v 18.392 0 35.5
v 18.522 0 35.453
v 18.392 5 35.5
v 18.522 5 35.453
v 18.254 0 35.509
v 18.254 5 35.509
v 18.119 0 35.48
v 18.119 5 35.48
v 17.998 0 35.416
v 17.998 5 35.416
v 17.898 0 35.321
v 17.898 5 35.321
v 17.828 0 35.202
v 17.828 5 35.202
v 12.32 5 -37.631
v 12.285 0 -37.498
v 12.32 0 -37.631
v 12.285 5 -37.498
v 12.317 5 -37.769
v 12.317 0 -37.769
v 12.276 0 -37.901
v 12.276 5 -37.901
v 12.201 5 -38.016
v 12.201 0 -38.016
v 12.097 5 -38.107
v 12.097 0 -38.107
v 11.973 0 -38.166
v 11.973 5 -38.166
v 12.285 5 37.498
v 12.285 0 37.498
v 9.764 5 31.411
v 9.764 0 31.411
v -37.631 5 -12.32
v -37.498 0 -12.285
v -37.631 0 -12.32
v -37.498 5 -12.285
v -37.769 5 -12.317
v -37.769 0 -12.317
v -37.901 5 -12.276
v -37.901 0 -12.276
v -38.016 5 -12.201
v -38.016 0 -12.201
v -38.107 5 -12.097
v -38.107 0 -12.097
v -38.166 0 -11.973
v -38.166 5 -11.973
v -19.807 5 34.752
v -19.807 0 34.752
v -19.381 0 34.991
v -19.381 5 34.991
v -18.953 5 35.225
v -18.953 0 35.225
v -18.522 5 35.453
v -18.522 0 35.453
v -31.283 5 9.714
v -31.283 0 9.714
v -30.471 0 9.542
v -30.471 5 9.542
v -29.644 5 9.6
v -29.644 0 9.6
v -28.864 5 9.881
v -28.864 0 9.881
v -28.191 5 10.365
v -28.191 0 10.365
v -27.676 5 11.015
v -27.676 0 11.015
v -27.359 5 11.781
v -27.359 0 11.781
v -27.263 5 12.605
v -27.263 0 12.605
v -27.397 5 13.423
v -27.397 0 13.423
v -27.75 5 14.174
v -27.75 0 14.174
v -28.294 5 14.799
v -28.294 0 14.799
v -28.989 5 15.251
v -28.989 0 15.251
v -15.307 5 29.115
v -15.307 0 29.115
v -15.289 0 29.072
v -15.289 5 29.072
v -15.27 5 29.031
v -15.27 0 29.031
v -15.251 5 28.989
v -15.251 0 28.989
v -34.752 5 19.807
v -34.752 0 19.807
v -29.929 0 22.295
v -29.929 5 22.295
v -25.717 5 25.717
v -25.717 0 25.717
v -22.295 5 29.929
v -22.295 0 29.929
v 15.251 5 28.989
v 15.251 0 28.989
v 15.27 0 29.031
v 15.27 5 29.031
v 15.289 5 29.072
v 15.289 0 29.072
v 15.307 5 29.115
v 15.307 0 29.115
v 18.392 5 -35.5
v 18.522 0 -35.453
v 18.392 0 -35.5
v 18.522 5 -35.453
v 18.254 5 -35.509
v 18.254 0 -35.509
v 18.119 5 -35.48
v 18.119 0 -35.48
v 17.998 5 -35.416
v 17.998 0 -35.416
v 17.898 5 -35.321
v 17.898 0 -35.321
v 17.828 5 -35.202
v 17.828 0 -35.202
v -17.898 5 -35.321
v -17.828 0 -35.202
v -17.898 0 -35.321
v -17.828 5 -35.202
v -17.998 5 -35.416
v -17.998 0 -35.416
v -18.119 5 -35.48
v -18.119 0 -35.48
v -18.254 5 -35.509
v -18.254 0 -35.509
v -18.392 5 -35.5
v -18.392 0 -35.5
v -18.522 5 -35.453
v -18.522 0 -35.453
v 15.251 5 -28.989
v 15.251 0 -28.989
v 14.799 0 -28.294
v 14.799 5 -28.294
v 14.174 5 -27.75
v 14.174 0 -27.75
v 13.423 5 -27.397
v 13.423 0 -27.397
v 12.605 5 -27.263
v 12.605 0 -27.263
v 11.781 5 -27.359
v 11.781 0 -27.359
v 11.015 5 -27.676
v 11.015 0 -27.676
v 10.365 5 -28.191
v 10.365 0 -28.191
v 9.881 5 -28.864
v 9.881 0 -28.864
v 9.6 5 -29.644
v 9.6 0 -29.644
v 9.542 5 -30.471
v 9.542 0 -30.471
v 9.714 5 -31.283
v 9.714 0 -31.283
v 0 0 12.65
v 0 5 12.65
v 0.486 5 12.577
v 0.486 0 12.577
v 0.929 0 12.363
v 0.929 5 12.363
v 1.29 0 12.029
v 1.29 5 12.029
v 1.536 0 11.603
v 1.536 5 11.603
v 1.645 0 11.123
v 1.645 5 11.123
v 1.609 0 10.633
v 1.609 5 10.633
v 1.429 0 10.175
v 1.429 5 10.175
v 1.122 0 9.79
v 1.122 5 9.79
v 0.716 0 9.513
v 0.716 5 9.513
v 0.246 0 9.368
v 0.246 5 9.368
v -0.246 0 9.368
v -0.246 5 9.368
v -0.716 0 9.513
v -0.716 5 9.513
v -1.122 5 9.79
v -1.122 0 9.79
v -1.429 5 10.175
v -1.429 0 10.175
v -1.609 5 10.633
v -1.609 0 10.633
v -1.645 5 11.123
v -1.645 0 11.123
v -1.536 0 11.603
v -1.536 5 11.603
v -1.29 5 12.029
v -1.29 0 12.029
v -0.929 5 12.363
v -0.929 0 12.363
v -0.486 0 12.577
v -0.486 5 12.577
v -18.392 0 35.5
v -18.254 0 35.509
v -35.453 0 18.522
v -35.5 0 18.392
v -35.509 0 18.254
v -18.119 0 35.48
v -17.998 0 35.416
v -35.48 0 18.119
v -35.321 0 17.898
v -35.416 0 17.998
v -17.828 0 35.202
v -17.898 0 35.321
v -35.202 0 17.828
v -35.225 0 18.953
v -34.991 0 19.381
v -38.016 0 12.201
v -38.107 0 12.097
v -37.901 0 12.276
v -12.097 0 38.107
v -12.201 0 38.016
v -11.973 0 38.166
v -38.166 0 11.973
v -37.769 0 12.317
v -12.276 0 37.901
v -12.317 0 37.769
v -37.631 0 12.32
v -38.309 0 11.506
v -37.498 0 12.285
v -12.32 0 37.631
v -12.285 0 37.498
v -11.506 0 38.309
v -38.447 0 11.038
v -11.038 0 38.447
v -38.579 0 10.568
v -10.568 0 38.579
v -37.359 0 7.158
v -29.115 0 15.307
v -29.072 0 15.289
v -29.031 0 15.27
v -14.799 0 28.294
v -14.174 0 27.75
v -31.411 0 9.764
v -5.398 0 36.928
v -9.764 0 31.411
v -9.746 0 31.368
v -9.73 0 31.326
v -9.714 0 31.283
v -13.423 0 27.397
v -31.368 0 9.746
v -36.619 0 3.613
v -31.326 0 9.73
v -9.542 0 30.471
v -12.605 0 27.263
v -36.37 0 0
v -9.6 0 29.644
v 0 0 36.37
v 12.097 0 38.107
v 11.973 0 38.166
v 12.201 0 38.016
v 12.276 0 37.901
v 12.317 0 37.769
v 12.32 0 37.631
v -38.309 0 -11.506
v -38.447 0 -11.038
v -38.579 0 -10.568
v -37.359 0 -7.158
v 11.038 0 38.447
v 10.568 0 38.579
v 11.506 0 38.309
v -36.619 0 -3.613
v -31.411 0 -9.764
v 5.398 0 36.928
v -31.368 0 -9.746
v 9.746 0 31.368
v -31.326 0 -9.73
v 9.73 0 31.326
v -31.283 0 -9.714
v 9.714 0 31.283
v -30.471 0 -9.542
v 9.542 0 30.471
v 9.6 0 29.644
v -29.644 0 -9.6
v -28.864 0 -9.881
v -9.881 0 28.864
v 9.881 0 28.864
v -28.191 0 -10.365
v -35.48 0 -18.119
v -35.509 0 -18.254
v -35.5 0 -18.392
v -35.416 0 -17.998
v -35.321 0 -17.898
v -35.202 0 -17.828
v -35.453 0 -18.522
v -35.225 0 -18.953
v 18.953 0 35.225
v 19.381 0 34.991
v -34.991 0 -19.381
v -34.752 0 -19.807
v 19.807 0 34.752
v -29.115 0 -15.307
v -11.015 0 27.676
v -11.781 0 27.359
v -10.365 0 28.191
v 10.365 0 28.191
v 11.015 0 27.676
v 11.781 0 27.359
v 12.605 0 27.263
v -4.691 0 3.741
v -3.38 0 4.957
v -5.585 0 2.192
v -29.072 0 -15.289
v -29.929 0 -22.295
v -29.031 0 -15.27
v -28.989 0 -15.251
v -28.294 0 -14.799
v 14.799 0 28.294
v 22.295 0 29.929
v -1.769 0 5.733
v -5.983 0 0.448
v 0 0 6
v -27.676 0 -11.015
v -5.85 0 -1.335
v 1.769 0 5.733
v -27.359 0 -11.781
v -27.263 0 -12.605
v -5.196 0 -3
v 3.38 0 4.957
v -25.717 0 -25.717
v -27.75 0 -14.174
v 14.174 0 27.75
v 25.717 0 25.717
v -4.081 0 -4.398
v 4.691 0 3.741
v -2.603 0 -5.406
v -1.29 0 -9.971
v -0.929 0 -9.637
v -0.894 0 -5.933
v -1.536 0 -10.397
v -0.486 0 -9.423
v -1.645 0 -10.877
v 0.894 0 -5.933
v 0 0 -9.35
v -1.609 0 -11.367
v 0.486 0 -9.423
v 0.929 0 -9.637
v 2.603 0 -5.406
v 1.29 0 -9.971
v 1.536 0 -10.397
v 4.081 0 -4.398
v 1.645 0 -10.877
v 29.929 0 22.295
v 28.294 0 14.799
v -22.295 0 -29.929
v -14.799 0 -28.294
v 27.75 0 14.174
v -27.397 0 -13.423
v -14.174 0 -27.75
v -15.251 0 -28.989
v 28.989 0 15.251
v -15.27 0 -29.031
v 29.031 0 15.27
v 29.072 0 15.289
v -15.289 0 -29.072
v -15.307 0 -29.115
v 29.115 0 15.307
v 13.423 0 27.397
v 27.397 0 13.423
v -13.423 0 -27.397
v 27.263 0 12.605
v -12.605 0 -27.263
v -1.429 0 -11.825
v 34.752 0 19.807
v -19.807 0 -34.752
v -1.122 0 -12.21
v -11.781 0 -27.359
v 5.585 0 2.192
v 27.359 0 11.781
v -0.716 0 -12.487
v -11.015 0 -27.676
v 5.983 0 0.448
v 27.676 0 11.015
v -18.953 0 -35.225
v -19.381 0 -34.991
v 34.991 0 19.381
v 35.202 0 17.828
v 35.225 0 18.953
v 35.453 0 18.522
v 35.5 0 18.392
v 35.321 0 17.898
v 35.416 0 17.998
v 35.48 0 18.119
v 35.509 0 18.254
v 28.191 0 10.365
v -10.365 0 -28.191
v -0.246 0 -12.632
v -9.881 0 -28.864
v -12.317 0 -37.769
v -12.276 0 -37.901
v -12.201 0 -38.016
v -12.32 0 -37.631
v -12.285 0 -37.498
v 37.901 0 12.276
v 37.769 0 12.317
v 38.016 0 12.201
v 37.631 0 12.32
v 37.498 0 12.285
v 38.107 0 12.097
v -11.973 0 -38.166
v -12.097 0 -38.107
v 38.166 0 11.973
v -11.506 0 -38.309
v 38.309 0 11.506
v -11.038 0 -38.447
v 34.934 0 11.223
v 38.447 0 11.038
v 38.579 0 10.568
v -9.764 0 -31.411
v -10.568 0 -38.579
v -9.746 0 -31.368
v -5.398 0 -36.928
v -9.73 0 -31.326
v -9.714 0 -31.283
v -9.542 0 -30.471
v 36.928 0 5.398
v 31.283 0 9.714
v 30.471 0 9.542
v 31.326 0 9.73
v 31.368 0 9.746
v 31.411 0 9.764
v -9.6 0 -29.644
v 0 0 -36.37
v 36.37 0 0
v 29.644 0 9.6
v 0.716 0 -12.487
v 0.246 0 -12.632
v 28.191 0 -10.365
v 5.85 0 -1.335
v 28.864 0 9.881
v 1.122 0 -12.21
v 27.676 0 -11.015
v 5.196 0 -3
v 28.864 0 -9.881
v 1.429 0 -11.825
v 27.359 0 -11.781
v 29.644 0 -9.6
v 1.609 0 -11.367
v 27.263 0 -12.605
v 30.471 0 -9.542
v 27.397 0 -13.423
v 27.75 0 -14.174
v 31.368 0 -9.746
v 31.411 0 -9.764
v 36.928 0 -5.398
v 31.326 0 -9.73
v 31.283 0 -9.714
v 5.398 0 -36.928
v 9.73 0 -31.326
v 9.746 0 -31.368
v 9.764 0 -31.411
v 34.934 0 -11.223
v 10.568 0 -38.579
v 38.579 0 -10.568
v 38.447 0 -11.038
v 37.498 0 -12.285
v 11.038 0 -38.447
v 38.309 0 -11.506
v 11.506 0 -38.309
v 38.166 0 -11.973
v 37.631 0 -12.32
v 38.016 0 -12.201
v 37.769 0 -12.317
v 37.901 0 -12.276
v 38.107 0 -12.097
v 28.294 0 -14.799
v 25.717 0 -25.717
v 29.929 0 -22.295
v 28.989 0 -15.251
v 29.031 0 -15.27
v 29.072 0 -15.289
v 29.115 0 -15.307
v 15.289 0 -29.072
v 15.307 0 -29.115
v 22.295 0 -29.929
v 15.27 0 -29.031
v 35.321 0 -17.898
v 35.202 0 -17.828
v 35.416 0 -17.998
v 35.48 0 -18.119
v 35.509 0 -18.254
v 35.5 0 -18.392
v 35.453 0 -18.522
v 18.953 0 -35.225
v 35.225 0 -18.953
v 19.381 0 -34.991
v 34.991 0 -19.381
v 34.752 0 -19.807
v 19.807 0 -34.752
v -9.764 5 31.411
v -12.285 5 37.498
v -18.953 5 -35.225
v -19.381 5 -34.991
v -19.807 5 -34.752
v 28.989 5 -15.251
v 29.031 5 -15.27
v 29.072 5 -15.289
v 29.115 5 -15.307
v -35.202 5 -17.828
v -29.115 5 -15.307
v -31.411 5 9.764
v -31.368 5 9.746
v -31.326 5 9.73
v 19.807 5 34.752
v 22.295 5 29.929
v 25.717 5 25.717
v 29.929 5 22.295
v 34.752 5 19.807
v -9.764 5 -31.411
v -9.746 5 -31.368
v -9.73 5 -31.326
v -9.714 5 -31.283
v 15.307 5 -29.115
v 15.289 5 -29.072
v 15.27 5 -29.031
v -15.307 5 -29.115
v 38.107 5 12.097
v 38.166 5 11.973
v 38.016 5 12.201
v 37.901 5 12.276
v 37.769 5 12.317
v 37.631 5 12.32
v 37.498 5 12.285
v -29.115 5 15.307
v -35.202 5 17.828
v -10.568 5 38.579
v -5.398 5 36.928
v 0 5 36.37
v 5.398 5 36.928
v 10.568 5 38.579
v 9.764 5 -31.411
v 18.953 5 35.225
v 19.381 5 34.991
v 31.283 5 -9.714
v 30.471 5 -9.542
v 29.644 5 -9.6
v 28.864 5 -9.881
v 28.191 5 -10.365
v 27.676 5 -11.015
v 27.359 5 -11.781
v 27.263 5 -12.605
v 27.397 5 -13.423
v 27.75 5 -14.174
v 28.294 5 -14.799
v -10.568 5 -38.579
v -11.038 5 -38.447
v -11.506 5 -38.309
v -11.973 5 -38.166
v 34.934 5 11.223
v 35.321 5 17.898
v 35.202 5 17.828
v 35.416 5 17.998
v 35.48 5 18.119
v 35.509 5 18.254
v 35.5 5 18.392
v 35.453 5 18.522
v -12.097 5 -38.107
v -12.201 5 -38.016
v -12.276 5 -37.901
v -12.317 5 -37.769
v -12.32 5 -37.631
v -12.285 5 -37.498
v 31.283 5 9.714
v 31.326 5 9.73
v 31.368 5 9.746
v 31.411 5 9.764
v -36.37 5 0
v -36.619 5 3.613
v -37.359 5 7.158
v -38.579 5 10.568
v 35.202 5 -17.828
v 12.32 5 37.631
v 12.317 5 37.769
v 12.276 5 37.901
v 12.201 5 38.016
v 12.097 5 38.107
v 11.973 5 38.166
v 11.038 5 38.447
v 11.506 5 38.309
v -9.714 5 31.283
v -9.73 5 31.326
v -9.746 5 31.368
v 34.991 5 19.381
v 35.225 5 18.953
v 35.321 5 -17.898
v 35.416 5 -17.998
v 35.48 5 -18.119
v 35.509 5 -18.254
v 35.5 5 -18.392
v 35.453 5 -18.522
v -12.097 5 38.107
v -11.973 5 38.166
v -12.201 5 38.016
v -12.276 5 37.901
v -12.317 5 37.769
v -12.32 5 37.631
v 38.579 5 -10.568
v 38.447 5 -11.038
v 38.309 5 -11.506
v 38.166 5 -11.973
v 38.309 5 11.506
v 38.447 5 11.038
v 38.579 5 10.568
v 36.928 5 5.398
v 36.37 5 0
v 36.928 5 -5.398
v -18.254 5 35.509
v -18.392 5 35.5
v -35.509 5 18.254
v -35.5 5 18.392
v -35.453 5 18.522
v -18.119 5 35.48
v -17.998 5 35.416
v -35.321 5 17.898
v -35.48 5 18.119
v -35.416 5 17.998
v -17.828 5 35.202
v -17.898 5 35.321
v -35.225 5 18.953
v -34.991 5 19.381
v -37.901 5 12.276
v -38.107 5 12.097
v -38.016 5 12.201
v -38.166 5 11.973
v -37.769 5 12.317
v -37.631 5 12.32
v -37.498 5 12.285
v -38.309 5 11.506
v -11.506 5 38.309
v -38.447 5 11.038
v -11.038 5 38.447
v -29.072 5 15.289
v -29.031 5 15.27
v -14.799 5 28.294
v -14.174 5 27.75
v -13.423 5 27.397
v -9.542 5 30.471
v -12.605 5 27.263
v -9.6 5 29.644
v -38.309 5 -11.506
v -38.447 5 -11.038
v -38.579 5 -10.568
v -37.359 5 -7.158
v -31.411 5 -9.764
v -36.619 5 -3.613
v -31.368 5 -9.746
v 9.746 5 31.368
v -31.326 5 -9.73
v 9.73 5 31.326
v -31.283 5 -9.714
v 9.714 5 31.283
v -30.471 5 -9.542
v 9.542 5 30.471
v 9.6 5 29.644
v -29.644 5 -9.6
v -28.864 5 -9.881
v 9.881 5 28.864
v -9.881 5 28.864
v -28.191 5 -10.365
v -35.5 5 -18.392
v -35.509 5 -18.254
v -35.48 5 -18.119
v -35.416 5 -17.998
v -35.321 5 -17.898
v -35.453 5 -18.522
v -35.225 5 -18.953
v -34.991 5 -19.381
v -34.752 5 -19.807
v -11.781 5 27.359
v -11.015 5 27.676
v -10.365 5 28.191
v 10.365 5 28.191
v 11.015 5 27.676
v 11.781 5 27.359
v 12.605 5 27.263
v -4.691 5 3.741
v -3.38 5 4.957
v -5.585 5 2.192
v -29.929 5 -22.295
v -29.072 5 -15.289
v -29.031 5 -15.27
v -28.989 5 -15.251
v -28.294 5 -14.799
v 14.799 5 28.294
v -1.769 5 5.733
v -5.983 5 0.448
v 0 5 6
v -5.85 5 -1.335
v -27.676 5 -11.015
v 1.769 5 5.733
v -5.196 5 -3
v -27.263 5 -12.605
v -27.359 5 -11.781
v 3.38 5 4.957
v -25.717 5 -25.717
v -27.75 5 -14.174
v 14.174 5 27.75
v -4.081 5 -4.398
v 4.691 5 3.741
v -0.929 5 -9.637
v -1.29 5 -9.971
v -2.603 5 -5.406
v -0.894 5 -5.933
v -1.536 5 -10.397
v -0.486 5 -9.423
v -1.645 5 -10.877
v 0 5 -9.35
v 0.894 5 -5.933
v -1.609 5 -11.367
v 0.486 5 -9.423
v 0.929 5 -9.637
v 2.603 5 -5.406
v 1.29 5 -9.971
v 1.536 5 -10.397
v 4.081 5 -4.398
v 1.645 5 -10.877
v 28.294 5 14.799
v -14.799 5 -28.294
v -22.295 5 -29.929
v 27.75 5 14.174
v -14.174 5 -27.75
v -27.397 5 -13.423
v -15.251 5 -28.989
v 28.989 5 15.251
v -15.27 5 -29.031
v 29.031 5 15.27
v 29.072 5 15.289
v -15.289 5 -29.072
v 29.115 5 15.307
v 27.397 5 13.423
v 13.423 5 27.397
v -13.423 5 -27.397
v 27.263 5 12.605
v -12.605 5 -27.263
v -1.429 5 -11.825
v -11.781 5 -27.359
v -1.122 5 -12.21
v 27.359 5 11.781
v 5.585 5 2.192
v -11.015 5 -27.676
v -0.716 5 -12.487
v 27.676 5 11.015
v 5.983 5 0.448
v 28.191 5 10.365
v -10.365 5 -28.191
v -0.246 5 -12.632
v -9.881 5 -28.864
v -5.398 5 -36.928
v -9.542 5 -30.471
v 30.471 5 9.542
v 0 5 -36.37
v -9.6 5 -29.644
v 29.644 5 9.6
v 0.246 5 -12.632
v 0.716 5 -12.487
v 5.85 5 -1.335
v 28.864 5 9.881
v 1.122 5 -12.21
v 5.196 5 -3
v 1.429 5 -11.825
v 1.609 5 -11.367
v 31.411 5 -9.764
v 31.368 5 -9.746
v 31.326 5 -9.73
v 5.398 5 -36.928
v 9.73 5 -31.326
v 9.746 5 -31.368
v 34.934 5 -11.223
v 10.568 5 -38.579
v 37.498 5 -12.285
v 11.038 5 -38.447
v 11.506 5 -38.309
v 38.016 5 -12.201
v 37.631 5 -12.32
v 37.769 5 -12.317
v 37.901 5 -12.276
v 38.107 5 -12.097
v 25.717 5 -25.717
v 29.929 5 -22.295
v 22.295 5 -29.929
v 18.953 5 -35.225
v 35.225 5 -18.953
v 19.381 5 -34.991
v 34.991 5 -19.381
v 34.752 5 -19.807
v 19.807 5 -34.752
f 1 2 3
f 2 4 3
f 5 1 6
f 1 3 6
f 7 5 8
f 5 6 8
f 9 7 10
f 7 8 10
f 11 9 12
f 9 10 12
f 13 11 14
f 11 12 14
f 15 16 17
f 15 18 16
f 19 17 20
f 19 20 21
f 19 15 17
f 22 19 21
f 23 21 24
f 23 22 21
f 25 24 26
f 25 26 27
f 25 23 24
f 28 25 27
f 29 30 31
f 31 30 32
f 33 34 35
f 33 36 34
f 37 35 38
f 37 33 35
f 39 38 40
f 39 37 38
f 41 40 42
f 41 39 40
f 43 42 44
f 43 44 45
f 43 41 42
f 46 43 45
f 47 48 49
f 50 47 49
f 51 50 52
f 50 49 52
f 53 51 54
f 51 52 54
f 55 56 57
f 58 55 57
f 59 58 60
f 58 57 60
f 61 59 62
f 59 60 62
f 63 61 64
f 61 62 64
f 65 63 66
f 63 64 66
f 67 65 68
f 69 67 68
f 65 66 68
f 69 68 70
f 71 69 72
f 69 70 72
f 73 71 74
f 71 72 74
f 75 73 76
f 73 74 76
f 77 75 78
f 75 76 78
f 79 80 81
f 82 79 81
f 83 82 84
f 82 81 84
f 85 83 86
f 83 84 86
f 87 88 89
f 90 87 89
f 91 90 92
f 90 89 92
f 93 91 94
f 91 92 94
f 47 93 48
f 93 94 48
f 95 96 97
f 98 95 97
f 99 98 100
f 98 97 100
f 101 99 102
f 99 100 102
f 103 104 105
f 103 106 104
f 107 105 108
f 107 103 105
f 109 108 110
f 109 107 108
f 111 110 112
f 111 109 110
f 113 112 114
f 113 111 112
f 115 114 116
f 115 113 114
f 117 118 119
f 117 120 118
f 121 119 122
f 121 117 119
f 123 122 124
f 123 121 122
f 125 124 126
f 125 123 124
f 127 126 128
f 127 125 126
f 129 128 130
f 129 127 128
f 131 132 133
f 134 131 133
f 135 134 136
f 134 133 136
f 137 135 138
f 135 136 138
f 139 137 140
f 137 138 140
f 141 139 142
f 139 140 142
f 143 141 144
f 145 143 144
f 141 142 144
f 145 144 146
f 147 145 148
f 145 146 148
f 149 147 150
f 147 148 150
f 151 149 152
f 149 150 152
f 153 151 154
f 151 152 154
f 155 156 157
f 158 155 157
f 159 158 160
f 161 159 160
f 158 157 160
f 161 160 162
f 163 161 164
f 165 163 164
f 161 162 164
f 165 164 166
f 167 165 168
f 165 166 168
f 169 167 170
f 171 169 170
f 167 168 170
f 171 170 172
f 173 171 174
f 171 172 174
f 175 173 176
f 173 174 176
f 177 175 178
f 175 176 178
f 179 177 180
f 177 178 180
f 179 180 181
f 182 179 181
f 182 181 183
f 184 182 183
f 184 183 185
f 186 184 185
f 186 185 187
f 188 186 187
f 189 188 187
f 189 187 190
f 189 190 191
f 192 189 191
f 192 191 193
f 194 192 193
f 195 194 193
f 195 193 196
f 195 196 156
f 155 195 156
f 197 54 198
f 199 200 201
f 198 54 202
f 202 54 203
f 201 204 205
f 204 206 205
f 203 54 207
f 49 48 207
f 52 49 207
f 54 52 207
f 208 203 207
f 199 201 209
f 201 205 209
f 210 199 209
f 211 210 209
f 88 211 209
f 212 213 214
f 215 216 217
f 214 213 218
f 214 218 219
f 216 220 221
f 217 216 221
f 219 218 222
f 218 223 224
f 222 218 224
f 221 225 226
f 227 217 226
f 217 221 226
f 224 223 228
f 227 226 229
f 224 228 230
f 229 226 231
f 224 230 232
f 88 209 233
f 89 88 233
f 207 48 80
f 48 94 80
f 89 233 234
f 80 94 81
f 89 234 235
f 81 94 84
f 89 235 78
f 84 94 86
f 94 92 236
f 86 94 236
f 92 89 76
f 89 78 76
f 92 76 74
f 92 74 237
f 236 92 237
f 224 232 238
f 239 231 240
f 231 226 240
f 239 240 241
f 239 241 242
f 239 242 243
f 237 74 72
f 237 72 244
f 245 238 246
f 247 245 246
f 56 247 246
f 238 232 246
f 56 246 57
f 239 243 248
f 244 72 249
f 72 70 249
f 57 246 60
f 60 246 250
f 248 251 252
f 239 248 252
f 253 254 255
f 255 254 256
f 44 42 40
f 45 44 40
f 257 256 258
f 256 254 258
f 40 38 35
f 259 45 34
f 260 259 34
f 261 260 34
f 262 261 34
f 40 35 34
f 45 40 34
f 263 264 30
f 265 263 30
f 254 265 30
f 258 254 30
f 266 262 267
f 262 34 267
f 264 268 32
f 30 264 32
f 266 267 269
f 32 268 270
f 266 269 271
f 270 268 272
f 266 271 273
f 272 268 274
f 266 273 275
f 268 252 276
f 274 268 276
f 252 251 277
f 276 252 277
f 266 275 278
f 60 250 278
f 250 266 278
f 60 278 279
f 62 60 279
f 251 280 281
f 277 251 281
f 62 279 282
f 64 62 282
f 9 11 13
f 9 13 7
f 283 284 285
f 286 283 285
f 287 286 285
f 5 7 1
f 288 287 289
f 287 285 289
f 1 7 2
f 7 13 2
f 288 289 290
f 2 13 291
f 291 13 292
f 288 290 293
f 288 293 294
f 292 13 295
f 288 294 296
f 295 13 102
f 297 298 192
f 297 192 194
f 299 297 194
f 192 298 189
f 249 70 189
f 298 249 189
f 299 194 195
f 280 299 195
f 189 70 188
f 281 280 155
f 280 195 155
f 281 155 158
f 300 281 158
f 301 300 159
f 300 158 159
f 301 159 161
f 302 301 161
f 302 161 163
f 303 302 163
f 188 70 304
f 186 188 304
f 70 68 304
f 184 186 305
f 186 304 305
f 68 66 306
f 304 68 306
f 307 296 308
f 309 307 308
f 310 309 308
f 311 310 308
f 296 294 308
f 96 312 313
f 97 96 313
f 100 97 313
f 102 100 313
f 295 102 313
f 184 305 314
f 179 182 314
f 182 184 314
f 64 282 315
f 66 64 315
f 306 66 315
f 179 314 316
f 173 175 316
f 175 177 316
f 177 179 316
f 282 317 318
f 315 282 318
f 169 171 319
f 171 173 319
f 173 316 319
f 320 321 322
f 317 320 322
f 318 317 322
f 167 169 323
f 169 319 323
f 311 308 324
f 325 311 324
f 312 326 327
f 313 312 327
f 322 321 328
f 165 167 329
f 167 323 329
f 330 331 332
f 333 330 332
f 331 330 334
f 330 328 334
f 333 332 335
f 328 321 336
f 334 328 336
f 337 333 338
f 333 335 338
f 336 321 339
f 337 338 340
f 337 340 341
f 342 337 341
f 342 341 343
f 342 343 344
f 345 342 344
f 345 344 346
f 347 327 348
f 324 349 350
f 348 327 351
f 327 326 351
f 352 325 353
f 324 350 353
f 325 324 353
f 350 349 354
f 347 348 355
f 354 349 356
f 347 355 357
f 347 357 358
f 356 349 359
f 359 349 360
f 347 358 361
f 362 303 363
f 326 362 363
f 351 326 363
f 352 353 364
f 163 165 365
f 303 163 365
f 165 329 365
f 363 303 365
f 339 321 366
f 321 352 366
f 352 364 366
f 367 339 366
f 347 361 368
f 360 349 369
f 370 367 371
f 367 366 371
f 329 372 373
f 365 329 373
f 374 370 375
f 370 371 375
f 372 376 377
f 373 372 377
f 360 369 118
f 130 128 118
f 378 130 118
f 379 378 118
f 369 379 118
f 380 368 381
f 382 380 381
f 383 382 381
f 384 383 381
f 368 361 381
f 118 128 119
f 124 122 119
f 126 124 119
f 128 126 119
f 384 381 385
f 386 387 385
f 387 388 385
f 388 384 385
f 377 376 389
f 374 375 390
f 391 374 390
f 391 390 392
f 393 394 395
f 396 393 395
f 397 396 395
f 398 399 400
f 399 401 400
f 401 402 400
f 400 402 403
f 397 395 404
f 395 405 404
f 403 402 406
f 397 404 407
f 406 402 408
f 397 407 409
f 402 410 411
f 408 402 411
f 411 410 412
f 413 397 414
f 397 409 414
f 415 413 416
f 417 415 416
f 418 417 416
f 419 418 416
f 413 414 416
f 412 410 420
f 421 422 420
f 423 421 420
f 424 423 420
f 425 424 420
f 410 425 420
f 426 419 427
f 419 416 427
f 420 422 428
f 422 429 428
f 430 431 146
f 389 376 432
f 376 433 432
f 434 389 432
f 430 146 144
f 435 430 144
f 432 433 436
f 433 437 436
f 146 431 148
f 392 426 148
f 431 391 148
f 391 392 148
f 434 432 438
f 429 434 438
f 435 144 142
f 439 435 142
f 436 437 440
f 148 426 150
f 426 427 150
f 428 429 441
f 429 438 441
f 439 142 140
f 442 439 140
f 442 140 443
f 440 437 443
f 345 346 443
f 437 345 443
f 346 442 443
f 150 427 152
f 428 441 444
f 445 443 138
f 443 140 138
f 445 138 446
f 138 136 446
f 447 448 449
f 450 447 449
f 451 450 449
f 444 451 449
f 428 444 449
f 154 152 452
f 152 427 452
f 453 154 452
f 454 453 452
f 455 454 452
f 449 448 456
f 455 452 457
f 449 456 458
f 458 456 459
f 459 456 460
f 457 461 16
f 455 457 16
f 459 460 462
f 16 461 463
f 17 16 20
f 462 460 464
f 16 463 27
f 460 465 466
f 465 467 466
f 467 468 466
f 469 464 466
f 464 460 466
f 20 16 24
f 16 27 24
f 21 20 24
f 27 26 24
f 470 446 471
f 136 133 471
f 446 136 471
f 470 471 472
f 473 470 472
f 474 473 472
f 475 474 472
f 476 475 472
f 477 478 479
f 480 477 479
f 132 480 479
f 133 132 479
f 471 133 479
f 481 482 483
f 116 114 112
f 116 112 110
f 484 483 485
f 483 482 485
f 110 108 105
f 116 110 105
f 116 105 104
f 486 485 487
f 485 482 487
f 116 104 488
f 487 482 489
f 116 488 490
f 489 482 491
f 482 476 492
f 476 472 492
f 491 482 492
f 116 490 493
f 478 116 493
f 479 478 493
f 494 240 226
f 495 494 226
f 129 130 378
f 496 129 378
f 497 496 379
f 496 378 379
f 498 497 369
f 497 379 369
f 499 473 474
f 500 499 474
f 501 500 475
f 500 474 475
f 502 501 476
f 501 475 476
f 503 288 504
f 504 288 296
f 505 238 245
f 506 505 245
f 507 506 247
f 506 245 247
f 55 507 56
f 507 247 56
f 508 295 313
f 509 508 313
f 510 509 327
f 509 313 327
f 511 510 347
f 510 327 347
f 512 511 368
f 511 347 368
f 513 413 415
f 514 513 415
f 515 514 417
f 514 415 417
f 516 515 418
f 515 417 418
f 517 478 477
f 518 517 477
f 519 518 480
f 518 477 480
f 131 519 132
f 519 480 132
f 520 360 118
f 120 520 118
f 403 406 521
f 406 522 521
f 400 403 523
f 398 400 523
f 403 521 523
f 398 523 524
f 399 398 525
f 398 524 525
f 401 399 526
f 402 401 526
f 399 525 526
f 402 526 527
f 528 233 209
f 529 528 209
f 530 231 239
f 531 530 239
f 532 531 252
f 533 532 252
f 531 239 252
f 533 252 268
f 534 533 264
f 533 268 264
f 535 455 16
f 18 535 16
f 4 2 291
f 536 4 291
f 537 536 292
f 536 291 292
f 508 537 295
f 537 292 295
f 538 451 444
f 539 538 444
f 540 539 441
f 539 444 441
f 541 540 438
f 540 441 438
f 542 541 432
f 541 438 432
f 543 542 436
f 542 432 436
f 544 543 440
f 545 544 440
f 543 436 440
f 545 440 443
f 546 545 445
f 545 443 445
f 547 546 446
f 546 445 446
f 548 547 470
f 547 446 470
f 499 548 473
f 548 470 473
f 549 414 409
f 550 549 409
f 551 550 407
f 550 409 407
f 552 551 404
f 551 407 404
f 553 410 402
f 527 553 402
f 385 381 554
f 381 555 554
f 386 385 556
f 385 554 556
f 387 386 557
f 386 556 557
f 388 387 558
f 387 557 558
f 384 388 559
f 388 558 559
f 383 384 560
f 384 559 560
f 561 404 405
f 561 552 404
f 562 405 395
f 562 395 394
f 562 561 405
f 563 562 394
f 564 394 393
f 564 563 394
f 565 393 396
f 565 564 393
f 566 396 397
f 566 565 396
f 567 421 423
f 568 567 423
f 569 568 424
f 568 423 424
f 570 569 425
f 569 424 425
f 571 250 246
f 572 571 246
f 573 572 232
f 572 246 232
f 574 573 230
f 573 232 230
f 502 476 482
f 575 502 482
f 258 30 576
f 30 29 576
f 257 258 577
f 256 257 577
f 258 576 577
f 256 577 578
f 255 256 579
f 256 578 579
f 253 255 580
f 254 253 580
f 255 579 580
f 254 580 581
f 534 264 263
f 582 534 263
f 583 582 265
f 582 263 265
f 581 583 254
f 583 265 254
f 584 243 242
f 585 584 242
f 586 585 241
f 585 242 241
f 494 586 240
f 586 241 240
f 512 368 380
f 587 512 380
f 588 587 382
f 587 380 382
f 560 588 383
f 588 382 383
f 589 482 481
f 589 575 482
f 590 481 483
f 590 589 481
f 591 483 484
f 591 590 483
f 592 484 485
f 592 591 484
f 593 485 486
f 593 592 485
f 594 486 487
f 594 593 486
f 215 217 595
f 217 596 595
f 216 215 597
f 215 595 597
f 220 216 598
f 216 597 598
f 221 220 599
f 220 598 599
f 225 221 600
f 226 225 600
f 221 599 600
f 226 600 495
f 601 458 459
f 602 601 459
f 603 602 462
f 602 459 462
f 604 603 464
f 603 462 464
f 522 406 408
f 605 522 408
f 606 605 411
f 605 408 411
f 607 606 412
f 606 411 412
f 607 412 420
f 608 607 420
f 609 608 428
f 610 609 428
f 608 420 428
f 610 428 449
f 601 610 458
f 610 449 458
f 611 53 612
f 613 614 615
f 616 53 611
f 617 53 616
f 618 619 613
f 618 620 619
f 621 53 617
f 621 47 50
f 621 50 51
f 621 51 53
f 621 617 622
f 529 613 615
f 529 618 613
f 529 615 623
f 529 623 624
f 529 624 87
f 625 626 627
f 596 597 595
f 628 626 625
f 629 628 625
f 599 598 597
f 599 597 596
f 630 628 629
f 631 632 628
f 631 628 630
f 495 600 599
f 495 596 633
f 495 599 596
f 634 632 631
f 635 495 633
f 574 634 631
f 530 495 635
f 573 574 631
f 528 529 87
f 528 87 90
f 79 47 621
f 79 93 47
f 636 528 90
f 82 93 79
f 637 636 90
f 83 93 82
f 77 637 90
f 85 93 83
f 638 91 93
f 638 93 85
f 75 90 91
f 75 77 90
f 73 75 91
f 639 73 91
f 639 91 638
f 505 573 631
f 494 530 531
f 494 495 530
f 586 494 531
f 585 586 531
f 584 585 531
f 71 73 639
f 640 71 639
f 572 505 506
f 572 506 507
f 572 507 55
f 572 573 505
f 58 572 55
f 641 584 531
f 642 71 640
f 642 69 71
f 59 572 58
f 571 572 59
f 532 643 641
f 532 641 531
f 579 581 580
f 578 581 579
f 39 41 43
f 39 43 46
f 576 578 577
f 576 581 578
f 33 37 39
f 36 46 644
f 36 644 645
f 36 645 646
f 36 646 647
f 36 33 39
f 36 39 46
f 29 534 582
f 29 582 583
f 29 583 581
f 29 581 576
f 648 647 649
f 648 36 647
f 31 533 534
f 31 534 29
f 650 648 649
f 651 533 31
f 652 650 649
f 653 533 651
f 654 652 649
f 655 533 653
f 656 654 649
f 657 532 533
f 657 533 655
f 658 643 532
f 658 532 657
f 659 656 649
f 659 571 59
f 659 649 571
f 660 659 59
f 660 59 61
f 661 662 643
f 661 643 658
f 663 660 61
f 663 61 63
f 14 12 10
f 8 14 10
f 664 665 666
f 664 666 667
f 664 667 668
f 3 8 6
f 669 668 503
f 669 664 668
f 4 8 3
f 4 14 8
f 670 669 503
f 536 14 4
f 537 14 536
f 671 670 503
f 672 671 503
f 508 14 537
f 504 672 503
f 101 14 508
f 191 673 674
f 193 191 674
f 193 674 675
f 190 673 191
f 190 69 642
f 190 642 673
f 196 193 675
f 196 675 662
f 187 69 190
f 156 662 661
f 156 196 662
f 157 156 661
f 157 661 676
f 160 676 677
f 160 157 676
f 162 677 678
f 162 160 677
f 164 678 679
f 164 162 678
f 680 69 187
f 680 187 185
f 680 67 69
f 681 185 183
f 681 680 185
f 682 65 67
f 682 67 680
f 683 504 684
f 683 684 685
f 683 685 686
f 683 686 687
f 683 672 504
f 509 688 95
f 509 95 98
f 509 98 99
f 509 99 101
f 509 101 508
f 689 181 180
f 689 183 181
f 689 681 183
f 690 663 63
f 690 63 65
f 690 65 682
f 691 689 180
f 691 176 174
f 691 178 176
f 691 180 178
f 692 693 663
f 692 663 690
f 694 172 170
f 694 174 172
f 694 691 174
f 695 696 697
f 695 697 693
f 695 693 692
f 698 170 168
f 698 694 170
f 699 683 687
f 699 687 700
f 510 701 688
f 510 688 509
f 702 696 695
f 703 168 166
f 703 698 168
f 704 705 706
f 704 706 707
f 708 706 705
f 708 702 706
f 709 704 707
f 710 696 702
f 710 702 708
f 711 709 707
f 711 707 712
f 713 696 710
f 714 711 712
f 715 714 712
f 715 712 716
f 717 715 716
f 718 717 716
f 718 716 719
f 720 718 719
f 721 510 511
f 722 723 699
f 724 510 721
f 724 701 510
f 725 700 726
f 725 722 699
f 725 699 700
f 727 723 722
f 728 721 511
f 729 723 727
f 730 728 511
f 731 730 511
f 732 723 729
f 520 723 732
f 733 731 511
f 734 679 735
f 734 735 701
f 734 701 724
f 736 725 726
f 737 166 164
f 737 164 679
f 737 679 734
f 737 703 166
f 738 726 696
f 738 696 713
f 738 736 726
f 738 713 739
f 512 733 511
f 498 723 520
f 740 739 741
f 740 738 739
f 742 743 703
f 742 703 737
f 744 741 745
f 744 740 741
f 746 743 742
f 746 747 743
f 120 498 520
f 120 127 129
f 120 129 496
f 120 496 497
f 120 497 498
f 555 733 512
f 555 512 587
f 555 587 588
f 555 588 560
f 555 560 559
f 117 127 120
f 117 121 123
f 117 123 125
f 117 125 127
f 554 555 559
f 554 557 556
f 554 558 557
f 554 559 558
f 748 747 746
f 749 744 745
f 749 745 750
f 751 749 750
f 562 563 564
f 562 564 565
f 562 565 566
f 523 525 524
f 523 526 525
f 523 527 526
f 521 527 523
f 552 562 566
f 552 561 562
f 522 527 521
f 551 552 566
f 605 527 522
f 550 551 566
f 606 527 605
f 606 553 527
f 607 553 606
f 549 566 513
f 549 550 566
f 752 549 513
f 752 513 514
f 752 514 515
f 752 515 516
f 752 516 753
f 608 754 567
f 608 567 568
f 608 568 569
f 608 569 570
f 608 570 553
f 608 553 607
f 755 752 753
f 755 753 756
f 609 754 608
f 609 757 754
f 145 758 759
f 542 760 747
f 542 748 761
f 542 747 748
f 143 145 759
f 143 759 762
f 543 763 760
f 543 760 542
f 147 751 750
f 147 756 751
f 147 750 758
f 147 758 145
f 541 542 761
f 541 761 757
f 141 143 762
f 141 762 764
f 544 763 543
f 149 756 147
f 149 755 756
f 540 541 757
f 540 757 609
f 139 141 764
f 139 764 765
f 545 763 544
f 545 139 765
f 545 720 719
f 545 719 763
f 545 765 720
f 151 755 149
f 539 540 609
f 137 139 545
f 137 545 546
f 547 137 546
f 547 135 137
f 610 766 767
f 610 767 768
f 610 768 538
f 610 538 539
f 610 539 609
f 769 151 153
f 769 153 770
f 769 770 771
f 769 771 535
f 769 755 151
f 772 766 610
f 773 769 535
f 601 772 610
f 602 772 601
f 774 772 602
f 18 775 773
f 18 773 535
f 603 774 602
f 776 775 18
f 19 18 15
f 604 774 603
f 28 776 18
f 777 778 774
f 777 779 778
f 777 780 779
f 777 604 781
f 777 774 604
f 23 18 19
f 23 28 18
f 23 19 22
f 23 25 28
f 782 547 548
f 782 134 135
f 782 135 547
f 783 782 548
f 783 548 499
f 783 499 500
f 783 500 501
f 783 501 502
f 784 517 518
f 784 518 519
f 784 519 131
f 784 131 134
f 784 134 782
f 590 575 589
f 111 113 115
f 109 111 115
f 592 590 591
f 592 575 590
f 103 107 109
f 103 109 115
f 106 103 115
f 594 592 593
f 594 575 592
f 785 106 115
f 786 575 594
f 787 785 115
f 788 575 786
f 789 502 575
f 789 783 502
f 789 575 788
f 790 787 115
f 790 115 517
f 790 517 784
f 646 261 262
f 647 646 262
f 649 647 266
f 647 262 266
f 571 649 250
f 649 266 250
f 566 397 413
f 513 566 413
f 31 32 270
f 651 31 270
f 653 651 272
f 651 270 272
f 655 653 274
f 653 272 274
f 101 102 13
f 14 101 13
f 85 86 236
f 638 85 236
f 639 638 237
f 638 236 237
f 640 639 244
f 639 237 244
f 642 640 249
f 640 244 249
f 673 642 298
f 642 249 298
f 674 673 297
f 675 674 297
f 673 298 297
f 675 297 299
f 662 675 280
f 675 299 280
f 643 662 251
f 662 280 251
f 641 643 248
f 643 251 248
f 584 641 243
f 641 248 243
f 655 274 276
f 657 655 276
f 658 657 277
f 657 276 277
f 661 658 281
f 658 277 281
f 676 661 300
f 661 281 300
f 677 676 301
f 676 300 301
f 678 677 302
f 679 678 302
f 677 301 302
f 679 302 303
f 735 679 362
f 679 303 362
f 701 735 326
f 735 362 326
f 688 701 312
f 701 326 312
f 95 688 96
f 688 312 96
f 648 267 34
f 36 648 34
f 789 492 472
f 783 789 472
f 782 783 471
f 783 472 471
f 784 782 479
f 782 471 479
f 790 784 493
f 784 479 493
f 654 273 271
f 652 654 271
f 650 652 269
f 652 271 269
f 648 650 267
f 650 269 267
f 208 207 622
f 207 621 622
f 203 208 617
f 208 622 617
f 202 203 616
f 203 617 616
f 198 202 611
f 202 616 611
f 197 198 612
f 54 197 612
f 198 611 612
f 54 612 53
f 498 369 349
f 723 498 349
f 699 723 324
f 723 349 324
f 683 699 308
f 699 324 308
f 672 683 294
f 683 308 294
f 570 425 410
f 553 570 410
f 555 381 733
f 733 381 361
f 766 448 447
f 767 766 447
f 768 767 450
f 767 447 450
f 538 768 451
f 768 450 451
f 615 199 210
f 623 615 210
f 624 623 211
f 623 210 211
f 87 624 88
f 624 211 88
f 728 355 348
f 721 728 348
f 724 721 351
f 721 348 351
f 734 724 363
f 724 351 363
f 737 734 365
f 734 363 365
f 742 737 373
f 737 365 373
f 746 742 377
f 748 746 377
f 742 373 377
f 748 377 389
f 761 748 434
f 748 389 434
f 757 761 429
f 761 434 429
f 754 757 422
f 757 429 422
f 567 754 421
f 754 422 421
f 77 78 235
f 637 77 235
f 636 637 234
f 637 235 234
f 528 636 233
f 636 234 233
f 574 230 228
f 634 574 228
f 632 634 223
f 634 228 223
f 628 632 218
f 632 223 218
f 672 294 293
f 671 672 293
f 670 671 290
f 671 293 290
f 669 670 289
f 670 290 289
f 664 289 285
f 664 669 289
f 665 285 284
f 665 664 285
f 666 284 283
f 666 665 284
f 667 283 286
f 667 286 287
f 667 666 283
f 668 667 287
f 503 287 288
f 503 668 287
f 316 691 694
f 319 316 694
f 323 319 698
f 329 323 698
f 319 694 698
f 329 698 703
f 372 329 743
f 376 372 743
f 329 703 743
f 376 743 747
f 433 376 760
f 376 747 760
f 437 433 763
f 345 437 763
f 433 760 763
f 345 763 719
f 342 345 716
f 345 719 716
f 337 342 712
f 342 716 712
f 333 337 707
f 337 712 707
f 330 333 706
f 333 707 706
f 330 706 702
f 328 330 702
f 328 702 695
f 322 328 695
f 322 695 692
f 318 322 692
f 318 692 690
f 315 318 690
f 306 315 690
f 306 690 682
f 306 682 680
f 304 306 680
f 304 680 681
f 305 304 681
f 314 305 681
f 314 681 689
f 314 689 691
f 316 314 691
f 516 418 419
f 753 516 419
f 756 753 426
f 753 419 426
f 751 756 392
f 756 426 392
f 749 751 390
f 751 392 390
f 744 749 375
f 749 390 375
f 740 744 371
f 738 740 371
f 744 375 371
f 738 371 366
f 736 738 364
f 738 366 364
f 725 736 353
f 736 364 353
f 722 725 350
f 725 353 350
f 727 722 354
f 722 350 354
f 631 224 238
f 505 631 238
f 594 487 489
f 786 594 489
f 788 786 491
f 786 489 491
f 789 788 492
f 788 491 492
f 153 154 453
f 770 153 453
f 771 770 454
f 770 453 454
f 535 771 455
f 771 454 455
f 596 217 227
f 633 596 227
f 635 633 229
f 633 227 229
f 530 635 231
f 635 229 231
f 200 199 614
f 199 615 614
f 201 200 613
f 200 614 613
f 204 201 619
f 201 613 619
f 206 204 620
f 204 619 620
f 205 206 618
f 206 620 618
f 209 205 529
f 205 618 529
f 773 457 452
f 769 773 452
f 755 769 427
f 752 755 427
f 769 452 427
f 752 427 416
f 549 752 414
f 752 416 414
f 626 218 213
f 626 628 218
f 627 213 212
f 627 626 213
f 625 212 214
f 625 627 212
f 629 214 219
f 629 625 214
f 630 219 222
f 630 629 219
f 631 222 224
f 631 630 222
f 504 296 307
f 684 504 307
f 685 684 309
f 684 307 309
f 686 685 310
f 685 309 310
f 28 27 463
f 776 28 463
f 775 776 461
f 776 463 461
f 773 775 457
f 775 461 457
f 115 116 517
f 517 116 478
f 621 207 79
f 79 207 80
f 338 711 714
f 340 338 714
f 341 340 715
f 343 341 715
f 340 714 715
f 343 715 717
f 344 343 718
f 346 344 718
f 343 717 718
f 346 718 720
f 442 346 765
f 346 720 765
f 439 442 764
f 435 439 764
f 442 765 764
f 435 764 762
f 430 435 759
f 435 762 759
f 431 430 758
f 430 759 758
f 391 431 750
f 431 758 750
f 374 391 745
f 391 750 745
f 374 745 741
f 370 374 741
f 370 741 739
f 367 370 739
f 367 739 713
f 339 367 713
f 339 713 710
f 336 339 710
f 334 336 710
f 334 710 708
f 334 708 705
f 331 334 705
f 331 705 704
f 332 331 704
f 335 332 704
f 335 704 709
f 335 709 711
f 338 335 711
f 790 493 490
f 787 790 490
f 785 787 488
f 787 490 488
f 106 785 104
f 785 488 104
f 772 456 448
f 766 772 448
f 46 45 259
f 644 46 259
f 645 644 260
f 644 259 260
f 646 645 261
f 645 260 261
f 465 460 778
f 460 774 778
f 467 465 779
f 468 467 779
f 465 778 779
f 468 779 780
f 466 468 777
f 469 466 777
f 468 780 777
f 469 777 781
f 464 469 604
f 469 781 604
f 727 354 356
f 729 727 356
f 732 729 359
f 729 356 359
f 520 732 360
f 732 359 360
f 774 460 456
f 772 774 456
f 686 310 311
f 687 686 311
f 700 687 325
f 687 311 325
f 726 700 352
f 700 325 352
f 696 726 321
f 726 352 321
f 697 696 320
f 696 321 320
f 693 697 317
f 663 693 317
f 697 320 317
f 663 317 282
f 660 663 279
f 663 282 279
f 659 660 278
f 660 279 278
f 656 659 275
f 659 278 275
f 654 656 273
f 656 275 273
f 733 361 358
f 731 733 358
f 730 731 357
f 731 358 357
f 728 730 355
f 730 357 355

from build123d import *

# Parameters (mm, degrees)
BOSS_EXTRUDE1_DEPTH = 5
SKETCH3_R           = 1.65
SKETCH3_R_2         = 6
CUT_EXTRUDE1_DEPTH  = 10
FILLET2_R           = 0.5


with BuildPart() as part:
    # Sketch2 → Boss-Extrude1 (new body)
    with BuildSketch(Plane(origin=(0, 0, 0), x_dir=(1, 0, 0), z_dir=(0, 1, 0))):
        with BuildLine():
            ThreePointArc((31.282579036, -9.713898359), (32.385596017, -4.912508835), (32.756061614, 0))
            ThreePointArc((32.756061614, 0), (32.385596017, 4.912508835), (31.282579036, 9.713898359))
            ThreePointArc((31.282579036, 9.713898359), (27.491016293, 11.387151792), (28.988887171, 15.251360368))
            ThreePointArc((28.988887171, 15.251360368), (23.162033292, 23.162033292), (15.251360368, 28.988887171))
            ThreePointArc((15.251360368, 28.988887171), (11.387151792, 27.491016293), (9.713898359, 31.282579036))
            ThreePointArc((9.713898359, 31.282579036), (0, 32.756061614), (-9.713898359, 31.282579036))
            ThreePointArc((-9.713898359, 31.282579036), (-11.387151792, 27.491016293), (-15.251360368, 28.988887171))
            ThreePointArc((-15.251360368, 28.988887171), (-23.162033292, 23.162033292), (-28.988887171, 15.251360368))
            ThreePointArc((-28.988887171, 15.251360368), (-27.491016293, 11.387151792), (-31.282579036, 9.713898359))
            ThreePointArc((-31.282579036, 9.713898359), (-32.756061614, 0), (-31.282579036, -9.713898359))
            ThreePointArc((-31.282579036, -9.713898359), (-27.491016293, -11.387151792), (-28.988887171, -15.251360368))
            ThreePointArc((-28.988887171, -15.251360368), (-23.162033292, -23.162033292), (-15.251360368, -28.988887171))
            ThreePointArc((-15.251360368, -28.988887171), (-11.387151792, -27.491016293), (-9.713898359, -31.282579036))
            ThreePointArc((-9.713898359, -31.282579036), (0, -32.756061614), (9.713898359, -31.282579036))
            ThreePointArc((9.713898359, -31.282579036), (11.387151792, -27.491016293), (15.251360368, -28.988887171))
            ThreePointArc((15.251360368, -28.988887171), (23.162033292, -23.162033292), (28.988887171, -15.251360368))
            ThreePointArc((28.988887171, -15.251360368), (27.491016293, -11.387151792), (31.282579036, -9.713898359))
        make_face()
        with BuildLine():
            Line((9.763563492, 31.410705188), (12.492586098, 37.999148577))
            ThreePointArc((12.492586098, 37.999148577), (11.533874506, 38.301040963), (10.567880231, 38.578749428))
            ThreePointArc((10.567880231, 38.578749428), (0, 36.37003279), (-10.567880231, 38.578749428))
            ThreePointArc((-10.567880231, 38.578749428), (-11.533874506, 38.301040963), (-12.492586098, 37.999148577))
            Line((-12.492586098, 37.999148577), (-9.763563492, 31.410705188))
            ThreePointArc((-9.763563492, 31.410705188), (-9.737997226, 31.346926513), (-9.713898359, 31.282579036))
            ThreePointArc((-9.713898359, 31.282579036), (0, 32.756061614), (9.713898359, 31.282579036))
            ThreePointArc((9.713898359, 31.282579036), (9.737997226, 31.346926513), (9.763563492, 31.410705188))
        make_face()
        with BuildLine():
            ThreePointArc((-18.035863293, 35.703047983), (-18.927244915, 35.238606668), (-19.806675556, 34.751915104))
            ThreePointArc((-19.806675556, 34.751915104), (-25.717496818, 25.717496818), (-34.751915104, 19.806675556))
            ThreePointArc((-34.751915104, 19.806675556), (-35.238606668, 18.927244915), (-35.703047983, 18.035863293))
            Line((-35.703047983, 18.035863293), (-29.114604594, 15.306840687))
            ThreePointArc((-29.114604594, 15.306840687), (-29.05142818, 15.279820434), (-28.988887171, 15.251360368))
            ThreePointArc((-28.988887171, 15.251360368), (-23.162033292, 23.162033292), (-15.251360368, 28.988887171))
            ThreePointArc((-15.251360368, 28.988887171), (-15.279820434, 29.05142818), (-15.306840687, 29.114604594))
            Line((-15.306840687, 29.114604594), (-18.035863293, 35.703047983))
        make_face()
        with BuildLine():
            ThreePointArc((-37.999148577, 12.492586098), (-38.301040963, 11.533874506), (-38.578749428, 10.567880231))
            ThreePointArc((-38.578749428, 10.567880231), (-36.928113831, 5.3981136), (-36.37003279, 0))
            ThreePointArc((-36.37003279, 0), (-36.928113831, -5.3981136), (-38.578749428, -10.567880231))
            ThreePointArc((-38.578749428, -10.567880231), (-38.301040963, -11.533874506), (-37.999148577, -12.492586098))
            Line((-37.999148577, -12.492586098), (-31.410705188, -9.763563492))
            ThreePointArc((-31.410705188, -9.763563492), (-31.346926513, -9.737997226), (-31.282579036, -9.713898359))
            ThreePointArc((-31.282579036, -9.713898359), (-32.756061614, 0), (-31.282579036, 9.713898359))
            ThreePointArc((-31.282579036, 9.713898359), (-31.346926513, 9.737997226), (-31.410705188, 9.763563492))
            Line((-31.410705188, 9.763563492), (-37.999148577, 12.492586098))
        make_face()
        with BuildLine():
            ThreePointArc((-15.306840687, -29.114604594), (-15.279820434, -29.05142818), (-15.251360368, -28.988887171))
            ThreePointArc((-15.251360368, -28.988887171), (-23.162033292, -23.162033292), (-28.988887171, -15.251360368))
            ThreePointArc((-28.988887171, -15.251360368), (-29.05142818, -15.279820434), (-29.114604594, -15.306840687))
            Line((-29.114604594, -15.306840687), (-35.703047983, -18.035863293))
            ThreePointArc((-35.703047983, -18.035863293), (-35.238606668, -18.927244915), (-34.751915104, -19.806675556))
            ThreePointArc((-34.751915104, -19.806675556), (-25.717496818, -25.717496818), (-19.806675556, -34.751915104))
            ThreePointArc((-19.806675556, -34.751915104), (-18.927244915, -35.238606668), (-18.035863293, -35.703047983))
            Line((-18.035863293, -35.703047983), (-15.306840687, -29.114604594))
        make_face()
        with BuildLine():
            ThreePointArc((9.763563492, -31.410705188), (9.737997226, -31.346926513), (9.713898359, -31.282579036))
            ThreePointArc((9.713898359, -31.282579036), (0, -32.756061614), (-9.713898359, -31.282579036))
            ThreePointArc((-9.713898359, -31.282579036), (-9.737997226, -31.346926513), (-9.763563492, -31.410705188))
            Line((-9.763563492, -31.410705188), (-12.492586098, -37.999148577))
            ThreePointArc((-12.492586098, -37.999148577), (-11.533874506, -38.301040963), (-10.567880231, -38.578749428))
            ThreePointArc((-10.567880231, -38.578749428), (0, -36.37003279), (10.567880231, -38.578749428))
            ThreePointArc((10.567880231, -38.578749428), (11.533874506, -38.301040963), (12.492586098, -37.999148577))
            Line((12.492586098, -37.999148577), (9.763563492, -31.410705188))
        make_face()
        with BuildLine():
            ThreePointArc((29.114604594, -15.306840687), (29.05142818, -15.279820434), (28.988887171, -15.251360368))
            ThreePointArc((28.988887171, -15.251360368), (23.162033292, -23.162033292), (15.251360368, -28.988887171))
            ThreePointArc((15.251360368, -28.988887171), (15.279820434, -29.05142818), (15.306840687, -29.114604594))
            Line((15.306840687, -29.114604594), (18.035863293, -35.703047983))
            ThreePointArc((18.035863293, -35.703047983), (18.927244915, -35.238606668), (19.806675556, -34.751915104))
            ThreePointArc((19.806675556, -34.751915104), (25.717496818, -25.717496818), (34.751915104, -19.806675556))
            ThreePointArc((34.751915104, -19.806675556), (35.238606668, -18.927244915), (35.703047983, -18.035863293))
            Line((35.703047983, -18.035863293), (29.114604594, -15.306840687))
        make_face()
        with BuildLine():
            ThreePointArc((34.934473466, -11.223156103), (33.305699609, -5.716308055), (32.756061614, 0))
            ThreePointArc((32.756061614, 0), (32.385596017, -4.912508835), (31.282579036, -9.713898359))
            ThreePointArc((31.282579036, -9.713898359), (31.346926513, -9.737997226), (31.410705188, -9.763563492))
            Line((31.410705188, -9.763563492), (34.934473466, -11.223156103))
        make_face()
        with BuildLine():
            ThreePointArc((38.578749428, 10.567880231), (38.301040963, 11.533874506), (37.999148577, 12.492586098))
            Line((37.999148577, 12.492586098), (34.934473466, 11.223156103))
            ThreePointArc((34.934473466, 11.223156103), (33.305699609, 5.716308055), (32.756061614, 0))
            ThreePointArc((32.756061614, 0), (33.305699609, -5.716308055), (34.934473466, -11.223156103))
            Line((34.934473466, -11.223156103), (37.999148577, -12.492586098))
            ThreePointArc((37.999148577, -12.492586098), (38.301040963, -11.533874506), (38.578749428, -10.567880231))
            ThreePointArc((38.578749428, -10.567880231), (36.37003279, 0), (38.578749428, 10.567880231))
        make_face()
        with BuildLine():
            ThreePointArc((32.756061614, 0), (33.305699609, 5.716308055), (34.934473466, 11.223156103))
            Line((34.934473466, 11.223156103), (31.410705188, 9.763563492))
            ThreePointArc((31.410705188, 9.763563492), (31.346926513, 9.737997226), (31.282579036, 9.713898359))
            ThreePointArc((31.282579036, 9.713898359), (32.385596017, 4.912508835), (32.756061614, 0))
        make_face()
        with BuildLine():
            Line((29.114604594, 15.306840687), (35.703047983, 18.035863293))
            ThreePointArc((35.703047983, 18.035863293), (35.238606668, 18.927244915), (34.751915104, 19.806675556))
            ThreePointArc((34.751915104, 19.806675556), (25.717496818, 25.717496818), (19.806675556, 34.751915104))
            ThreePointArc((19.806675556, 34.751915104), (18.927244915, 35.238606668), (18.035863293, 35.703047983))
            Line((18.035863293, 35.703047983), (15.306840687, 29.114604594))
            ThreePointArc((15.306840687, 29.114604594), (15.279820434, 29.05142818), (15.251360368, 28.988887171))
            ThreePointArc((15.251360368, 28.988887171), (23.162033292, 23.162033292), (28.988887171, 15.251360368))
            ThreePointArc((28.988887171, 15.251360368), (29.05142818, 15.279820434), (29.114604594, 15.306840687))
        make_face()
    extrude(amount=BOSS_EXTRUDE1_DEPTH)

    # Sketch3 → Cut-Extrude1 (cut)
    with BuildSketch(Plane(origin=(0, 5, 0), x_dir=(1, 0, 0), z_dir=(0, 1, 0))):
        with Locations(Location((0, 11, 0), (0, 0, 270))):
            Circle(SKETCH3_R)
        with Locations(Location((0, 0, 0), (0, 0, 270))):
            Circle(SKETCH3_R_2)
        with Locations(Location((0, -11, 0), (0, 0, 270))):
            Circle(SKETCH3_R)
    extrude(amount=-CUT_EXTRUDE1_DEPTH, mode=Mode.SUBTRACT)

    # Fillet2
    fillet2_edges = [part.edges().sort_by_distance(p)[0] for p in [
        (18.035863293, 2.5, -35.703047983),
        (35.703047983, 2.5, -18.035863293),
        (37.999148577, 2.5, -12.492586098),
        (37.999148577, 2.5, 12.492586098),
        (35.703047983, 2.5, 18.035863293),
        (18.035863293, 2.5, 35.703047983),
        (12.492586098, 2.5, 37.999148577),
        (-12.492586098, 2.5, 37.999148577),
        (-18.035863293, 2.5, 35.703047983),
        (-35.703047983, 2.5, 18.035863293),
        (-37.999148577, 2.5, 12.492586098),
        (-37.999148577, 2.5, -12.492586098),
        (-35.703047983, 2.5, -18.035863293),
        (-18.035863293, 2.5, -35.703047983),
        (-12.492586098, 2.5, -37.999148577),
        (12.492586098, 2.5, -37.999148577),
    ]]
    fillet(fillet2_edges, radius=FILLET2_R)


solid = part.part
